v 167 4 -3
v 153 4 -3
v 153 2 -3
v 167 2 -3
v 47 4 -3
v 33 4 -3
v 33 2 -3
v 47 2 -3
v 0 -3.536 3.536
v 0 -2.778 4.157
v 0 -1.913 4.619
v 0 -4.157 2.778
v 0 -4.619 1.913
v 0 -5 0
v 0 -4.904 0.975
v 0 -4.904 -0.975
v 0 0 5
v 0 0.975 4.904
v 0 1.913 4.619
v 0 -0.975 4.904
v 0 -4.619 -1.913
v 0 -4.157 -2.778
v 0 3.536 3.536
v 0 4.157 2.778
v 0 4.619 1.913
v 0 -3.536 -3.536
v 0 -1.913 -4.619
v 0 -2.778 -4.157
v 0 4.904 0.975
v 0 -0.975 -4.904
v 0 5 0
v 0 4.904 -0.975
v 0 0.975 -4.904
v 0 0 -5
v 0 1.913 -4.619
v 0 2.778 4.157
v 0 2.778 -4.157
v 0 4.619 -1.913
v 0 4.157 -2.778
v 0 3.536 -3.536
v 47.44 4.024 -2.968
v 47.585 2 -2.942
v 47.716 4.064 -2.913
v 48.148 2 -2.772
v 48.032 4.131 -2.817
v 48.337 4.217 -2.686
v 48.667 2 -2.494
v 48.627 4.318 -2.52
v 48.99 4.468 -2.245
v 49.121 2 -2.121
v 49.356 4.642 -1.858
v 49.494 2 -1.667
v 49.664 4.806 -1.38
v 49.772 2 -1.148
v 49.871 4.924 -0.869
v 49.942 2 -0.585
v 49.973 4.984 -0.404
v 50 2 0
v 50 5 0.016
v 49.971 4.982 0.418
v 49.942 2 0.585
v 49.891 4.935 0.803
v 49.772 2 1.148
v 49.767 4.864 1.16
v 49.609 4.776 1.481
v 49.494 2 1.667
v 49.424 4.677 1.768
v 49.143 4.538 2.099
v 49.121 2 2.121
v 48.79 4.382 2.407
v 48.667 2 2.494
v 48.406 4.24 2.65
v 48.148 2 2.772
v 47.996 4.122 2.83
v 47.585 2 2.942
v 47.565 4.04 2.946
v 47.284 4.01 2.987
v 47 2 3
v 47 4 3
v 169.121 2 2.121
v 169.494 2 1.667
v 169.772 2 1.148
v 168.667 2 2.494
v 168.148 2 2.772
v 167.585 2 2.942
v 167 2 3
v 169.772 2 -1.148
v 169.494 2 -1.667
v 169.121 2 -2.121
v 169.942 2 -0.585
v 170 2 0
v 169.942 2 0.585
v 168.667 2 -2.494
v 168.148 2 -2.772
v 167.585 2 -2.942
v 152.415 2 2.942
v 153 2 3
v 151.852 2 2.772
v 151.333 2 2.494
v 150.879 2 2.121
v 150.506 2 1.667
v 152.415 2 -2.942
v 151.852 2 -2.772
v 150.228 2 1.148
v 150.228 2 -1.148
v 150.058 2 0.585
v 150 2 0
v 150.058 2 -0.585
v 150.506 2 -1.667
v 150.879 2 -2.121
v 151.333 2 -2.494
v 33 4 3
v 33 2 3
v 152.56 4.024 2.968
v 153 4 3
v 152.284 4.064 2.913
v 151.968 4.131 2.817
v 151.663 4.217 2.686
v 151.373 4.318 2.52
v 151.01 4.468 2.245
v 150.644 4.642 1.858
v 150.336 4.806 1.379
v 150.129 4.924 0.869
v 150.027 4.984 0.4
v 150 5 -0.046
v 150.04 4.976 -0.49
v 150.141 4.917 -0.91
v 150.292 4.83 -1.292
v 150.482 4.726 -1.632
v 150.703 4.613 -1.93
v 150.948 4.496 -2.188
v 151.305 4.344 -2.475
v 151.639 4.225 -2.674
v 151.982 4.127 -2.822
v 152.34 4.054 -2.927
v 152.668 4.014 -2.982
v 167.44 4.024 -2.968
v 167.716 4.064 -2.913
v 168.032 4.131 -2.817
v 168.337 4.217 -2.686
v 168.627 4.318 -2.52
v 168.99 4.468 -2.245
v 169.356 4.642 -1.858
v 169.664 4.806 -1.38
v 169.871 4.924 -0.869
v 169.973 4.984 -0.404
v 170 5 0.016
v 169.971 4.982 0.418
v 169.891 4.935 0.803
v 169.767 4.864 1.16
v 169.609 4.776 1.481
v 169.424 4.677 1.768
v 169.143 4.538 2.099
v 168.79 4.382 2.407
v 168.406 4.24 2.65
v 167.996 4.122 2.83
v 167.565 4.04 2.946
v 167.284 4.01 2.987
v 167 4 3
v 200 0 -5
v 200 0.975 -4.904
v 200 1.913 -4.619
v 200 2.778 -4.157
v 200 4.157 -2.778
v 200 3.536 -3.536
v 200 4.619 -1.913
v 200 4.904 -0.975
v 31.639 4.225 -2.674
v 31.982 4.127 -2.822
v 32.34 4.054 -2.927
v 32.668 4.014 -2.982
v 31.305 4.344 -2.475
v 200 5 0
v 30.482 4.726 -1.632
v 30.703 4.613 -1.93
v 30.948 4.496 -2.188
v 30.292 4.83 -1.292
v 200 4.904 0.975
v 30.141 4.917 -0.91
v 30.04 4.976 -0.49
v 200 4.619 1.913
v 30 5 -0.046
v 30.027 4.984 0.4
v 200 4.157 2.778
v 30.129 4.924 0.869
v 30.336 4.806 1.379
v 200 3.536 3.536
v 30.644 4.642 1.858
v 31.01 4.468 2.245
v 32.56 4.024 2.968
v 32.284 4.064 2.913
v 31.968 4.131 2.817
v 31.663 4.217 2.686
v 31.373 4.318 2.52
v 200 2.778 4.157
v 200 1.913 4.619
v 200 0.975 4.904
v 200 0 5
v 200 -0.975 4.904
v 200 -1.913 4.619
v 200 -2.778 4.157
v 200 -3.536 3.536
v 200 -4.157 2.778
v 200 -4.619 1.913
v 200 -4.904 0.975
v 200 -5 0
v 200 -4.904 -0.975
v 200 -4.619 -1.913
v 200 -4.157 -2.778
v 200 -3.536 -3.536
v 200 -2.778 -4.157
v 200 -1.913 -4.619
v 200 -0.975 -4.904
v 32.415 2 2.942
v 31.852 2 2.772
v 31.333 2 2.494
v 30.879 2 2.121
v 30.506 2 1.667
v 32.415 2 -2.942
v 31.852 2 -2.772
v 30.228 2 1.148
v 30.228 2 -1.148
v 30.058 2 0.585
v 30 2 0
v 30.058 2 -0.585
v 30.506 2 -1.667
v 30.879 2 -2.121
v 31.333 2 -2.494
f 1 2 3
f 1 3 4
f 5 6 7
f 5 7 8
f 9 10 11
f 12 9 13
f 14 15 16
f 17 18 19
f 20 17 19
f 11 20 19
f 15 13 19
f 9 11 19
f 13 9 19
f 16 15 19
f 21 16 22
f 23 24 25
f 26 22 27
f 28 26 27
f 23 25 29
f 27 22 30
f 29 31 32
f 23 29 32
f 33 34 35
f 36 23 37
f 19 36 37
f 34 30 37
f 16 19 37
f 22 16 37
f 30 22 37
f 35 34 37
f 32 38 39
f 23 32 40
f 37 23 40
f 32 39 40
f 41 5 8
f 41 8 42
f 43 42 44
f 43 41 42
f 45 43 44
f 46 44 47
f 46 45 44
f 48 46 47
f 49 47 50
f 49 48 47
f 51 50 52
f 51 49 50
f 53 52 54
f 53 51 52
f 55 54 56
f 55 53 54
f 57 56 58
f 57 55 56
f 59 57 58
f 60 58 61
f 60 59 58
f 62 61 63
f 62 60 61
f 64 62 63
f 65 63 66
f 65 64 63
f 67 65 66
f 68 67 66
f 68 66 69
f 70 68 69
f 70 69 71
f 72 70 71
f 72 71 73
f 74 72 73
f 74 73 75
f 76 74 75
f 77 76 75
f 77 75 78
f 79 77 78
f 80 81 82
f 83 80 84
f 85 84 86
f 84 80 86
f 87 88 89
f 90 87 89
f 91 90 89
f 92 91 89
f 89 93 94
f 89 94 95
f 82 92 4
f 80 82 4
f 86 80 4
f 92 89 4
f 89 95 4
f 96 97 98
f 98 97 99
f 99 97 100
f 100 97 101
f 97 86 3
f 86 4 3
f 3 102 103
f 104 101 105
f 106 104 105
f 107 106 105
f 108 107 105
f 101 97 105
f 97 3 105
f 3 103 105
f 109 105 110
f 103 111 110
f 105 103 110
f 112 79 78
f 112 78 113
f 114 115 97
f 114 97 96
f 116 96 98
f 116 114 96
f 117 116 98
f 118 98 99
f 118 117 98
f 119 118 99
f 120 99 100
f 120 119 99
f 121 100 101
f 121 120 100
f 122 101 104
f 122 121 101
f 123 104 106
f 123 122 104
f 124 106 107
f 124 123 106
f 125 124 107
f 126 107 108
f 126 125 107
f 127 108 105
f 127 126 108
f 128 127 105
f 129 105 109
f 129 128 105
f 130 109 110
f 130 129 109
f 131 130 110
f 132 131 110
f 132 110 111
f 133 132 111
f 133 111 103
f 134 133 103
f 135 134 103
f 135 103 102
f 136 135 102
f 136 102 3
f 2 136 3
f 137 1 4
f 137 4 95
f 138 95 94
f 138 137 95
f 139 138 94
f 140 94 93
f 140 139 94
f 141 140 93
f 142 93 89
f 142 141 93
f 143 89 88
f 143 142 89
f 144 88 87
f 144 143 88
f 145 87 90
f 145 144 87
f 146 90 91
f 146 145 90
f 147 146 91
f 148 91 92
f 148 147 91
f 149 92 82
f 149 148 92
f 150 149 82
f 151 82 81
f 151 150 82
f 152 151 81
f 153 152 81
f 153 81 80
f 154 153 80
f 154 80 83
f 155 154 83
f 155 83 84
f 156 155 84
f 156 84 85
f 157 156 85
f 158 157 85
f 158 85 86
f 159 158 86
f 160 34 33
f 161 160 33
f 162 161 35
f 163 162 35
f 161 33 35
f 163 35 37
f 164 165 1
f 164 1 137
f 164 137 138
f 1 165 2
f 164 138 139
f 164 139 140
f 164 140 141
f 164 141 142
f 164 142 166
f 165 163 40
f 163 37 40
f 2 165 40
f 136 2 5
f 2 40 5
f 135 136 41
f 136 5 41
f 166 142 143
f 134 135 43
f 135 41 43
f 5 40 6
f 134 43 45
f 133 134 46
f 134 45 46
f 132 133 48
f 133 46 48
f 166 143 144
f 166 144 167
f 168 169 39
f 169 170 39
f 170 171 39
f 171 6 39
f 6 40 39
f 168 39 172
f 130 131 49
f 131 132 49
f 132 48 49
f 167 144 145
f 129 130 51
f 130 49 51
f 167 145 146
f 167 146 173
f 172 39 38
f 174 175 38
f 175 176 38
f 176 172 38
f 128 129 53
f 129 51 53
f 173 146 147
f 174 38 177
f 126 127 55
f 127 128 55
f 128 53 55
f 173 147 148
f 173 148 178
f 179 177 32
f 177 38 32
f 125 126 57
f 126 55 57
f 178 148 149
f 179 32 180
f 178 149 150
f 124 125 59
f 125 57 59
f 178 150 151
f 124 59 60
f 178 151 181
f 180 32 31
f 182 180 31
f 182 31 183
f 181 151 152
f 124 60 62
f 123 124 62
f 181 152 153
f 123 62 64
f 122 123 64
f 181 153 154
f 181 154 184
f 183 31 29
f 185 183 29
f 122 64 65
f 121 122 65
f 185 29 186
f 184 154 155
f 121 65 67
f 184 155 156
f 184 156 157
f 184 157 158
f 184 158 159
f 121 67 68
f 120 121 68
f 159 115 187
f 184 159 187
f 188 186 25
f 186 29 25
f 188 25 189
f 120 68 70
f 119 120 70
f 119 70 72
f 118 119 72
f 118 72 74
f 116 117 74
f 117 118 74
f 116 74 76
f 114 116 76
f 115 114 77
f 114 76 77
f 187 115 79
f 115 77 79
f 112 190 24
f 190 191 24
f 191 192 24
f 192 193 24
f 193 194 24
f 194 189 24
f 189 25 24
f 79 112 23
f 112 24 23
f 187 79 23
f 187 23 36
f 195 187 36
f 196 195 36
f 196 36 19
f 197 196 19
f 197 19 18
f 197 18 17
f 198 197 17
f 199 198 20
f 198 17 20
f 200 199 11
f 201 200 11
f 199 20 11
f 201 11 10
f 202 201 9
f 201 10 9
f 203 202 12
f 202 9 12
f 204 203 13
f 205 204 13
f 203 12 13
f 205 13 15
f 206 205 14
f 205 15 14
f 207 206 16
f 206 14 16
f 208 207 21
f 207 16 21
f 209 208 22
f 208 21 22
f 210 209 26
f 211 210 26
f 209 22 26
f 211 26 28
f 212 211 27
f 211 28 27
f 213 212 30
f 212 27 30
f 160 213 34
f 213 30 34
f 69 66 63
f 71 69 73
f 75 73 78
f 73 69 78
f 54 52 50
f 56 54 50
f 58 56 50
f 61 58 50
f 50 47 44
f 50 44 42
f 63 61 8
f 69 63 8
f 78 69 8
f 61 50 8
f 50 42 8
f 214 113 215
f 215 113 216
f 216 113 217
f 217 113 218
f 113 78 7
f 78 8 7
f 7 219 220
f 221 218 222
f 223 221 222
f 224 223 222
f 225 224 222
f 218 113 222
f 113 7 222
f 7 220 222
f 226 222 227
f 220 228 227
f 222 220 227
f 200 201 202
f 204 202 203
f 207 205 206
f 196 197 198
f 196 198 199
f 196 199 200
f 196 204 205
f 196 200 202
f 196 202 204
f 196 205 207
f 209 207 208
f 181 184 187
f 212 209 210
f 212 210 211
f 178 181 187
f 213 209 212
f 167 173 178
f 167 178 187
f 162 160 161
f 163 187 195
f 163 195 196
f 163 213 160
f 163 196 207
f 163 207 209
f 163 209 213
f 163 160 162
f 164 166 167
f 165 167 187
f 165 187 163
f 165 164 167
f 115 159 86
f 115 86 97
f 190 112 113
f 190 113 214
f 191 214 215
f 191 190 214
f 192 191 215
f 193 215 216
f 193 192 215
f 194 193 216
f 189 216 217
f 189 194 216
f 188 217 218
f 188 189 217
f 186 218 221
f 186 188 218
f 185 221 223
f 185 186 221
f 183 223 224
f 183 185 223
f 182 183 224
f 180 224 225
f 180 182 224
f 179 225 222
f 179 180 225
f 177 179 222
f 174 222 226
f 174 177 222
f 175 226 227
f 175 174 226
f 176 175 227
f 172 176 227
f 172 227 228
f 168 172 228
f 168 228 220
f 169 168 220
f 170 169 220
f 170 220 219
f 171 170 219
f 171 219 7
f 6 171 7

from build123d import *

# Parameters (mm, degrees)
SKETCH_1_R          = 5
EXTRUDE_1_DEPTH     = 100
CUT_EXTRUDE_1_DEPTH = 3
SKETCH_3_R          = 5
EXTRUDE_2_DEPTH     = 100
CUT_EXTRUDE_2_DEPTH = 3


with BuildPart() as part:
    # 草图1 → 凸台-拉伸1 (new body)
    with BuildSketch(Plane(origin=(0, 0, 0), x_dir=(0, 0, -1), z_dir=(1, 0, 0))):
        Circle(SKETCH_1_R)
    extrude(amount=EXTRUDE_1_DEPTH)

    # 草图2 → 切除-拉伸1 (cut)
    with BuildSketch(Plane(origin=(0, 5, 0), x_dir=(1, 0, 0), z_dir=(0, 1, 0))):
        with BuildLine():
            Line((33, 3), (47, 3))
            ThreePointArc((47, 3), (50, 0), (47, -3))
            Line((47, -3), (33, -3))
            ThreePointArc((33, -3), (30, 0), (33, 3))
        make_face()
    extrude(amount=-CUT_EXTRUDE_1_DEPTH, mode=Mode.SUBTRACT)

    # 草图3 → 凸台-拉伸2 (add)
    with BuildSketch(Plane(origin=(100, 0, 0), x_dir=(0, 0, -1), z_dir=(1, 0, 0))):
        Circle(SKETCH_3_R)
    extrude(amount=EXTRUDE_2_DEPTH)

    # 草图4 → 切除-拉伸2 (cut)
    with BuildSketch(Plane(origin=(0, 5, 0), x_dir=(1, 0, 0), z_dir=(0, 1, 0))):
        with BuildLine():
            Line((153, 3), (167, 3))
            ThreePointArc((167, 3), (170, 0), (167, -3))
            Line((167, -3), (153, -3))
            ThreePointArc((153, -3), (150, 0), (153, 3))
        make_face()
    extrude(amount=-CUT_EXTRUDE_2_DEPTH, mode=Mode.SUBTRACT)


solid = part.part
